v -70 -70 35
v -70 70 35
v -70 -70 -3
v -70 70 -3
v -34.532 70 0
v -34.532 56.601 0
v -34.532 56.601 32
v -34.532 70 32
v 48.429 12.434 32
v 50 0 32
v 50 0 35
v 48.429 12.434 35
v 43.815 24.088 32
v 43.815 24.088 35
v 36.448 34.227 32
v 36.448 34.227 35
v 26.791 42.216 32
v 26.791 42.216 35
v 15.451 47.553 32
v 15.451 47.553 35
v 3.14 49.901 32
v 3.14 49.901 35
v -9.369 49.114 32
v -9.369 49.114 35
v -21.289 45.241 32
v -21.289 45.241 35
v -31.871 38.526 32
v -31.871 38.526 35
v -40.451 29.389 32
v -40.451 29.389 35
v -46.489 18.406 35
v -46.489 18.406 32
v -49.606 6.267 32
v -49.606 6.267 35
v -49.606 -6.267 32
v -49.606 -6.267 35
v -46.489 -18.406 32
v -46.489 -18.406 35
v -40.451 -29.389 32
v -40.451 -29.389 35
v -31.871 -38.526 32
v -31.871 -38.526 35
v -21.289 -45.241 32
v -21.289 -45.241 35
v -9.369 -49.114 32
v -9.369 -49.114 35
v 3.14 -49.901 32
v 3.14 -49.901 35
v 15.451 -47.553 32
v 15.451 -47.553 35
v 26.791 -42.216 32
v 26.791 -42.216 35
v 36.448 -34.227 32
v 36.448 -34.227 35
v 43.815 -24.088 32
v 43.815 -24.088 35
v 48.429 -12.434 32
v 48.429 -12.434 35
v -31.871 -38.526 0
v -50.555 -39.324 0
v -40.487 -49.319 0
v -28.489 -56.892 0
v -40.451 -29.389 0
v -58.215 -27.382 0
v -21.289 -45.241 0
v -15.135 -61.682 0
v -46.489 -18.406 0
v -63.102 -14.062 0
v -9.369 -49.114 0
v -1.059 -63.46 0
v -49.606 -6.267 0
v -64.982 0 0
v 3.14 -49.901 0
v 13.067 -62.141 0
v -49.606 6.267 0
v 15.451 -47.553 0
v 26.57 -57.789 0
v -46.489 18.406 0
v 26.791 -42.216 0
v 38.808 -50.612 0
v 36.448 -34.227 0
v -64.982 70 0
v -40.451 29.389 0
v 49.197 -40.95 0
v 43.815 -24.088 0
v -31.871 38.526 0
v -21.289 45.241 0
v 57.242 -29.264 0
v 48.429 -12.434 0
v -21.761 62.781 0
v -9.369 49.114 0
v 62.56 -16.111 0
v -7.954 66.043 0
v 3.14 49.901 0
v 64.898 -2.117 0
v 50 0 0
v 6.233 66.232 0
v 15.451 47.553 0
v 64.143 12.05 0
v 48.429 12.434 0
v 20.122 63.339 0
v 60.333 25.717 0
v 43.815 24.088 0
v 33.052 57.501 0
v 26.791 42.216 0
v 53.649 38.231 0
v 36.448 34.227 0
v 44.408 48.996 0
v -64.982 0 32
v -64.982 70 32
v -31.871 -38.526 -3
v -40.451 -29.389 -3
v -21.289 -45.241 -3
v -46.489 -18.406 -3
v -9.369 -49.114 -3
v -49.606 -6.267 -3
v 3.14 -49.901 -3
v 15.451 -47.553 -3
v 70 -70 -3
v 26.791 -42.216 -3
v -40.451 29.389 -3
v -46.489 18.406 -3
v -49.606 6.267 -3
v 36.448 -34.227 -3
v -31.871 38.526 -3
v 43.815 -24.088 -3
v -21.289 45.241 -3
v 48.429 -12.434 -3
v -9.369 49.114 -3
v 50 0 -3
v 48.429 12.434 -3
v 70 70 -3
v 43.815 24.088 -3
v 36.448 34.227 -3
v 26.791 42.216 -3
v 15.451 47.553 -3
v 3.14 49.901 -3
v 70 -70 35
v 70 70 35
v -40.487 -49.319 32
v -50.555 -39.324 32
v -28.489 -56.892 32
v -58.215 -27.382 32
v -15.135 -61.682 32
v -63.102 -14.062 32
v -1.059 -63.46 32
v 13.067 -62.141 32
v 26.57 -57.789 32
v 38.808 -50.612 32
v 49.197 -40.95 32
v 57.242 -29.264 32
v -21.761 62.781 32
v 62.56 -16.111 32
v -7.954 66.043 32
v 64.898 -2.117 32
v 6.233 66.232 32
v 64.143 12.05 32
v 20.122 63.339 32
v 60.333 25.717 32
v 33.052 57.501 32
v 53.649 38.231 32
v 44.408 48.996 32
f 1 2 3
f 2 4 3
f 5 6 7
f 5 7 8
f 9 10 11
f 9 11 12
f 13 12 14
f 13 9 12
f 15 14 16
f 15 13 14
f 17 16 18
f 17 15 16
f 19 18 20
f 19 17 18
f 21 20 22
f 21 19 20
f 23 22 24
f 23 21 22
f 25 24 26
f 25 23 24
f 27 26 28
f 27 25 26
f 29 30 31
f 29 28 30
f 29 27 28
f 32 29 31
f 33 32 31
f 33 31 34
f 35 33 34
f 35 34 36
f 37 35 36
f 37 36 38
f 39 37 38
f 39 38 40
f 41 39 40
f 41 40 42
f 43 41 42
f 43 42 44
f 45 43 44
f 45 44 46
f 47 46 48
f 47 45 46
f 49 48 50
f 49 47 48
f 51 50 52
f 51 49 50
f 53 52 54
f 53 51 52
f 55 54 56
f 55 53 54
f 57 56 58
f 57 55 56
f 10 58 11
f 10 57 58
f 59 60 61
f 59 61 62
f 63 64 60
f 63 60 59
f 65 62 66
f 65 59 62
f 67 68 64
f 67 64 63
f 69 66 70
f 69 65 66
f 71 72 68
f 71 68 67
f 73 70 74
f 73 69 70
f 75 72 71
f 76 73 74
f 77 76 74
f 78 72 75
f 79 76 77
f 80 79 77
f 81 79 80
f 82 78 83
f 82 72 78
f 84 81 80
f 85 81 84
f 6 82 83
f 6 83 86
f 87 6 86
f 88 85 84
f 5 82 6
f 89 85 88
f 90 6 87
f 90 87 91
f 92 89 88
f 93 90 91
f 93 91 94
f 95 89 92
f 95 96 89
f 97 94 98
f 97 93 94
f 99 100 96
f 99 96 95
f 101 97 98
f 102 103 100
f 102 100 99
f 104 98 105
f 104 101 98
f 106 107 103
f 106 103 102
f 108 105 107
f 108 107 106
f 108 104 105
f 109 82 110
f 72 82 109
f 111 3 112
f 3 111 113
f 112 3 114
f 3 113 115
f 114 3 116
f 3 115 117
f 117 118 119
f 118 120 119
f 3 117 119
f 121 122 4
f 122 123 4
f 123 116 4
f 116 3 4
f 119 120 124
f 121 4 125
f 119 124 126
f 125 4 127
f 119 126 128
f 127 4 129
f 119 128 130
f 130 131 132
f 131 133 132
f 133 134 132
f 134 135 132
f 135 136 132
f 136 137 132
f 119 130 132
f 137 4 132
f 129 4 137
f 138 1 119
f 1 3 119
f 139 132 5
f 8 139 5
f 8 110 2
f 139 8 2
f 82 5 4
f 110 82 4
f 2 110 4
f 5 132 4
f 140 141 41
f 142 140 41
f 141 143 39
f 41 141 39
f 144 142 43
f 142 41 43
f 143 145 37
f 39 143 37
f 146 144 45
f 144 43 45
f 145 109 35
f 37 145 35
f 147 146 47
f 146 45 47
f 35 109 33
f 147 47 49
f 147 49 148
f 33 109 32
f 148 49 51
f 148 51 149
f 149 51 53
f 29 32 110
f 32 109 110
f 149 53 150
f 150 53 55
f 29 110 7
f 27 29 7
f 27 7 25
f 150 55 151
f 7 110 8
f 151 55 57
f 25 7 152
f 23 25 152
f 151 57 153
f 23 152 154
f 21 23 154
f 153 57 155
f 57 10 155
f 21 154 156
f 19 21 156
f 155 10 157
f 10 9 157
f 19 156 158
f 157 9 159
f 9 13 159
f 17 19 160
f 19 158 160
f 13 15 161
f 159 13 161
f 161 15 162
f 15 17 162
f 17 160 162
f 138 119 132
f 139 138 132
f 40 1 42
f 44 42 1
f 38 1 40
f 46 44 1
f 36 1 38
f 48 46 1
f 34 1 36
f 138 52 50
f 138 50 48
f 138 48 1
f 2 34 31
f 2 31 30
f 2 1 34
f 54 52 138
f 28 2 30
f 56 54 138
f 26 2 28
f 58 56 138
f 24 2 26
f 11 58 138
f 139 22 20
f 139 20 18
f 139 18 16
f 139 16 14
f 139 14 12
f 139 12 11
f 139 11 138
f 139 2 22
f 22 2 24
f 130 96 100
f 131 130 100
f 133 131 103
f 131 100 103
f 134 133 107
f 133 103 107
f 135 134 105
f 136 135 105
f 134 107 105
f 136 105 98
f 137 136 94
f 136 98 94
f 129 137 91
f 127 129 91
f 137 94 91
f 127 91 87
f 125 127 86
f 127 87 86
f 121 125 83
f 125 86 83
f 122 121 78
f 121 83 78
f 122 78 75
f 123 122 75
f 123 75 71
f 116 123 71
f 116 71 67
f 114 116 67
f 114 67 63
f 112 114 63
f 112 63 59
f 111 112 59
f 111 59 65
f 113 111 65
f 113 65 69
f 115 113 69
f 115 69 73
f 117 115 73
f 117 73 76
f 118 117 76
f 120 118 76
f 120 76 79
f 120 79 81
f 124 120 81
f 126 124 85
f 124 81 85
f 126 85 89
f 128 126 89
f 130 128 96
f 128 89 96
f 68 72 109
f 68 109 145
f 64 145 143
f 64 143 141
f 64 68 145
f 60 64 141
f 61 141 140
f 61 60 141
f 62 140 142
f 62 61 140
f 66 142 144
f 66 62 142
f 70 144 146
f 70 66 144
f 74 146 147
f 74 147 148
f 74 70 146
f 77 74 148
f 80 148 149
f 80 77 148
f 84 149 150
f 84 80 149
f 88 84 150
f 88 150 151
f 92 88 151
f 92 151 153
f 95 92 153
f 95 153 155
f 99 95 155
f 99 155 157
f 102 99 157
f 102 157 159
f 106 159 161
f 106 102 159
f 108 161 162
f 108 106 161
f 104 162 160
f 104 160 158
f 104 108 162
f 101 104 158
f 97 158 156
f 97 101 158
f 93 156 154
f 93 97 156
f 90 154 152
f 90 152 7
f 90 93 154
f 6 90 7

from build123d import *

# Parameters (mm, degrees)
F0_R     = 50
F1_DEPTH = 3
F2_DEPTH = 35
F3_DEPTH = 32
F4_DEPTH = 84.6
F5_DEPTH = 25


with BuildPart() as f1:
    # F0 (on Top) → F1 (new body)
    with BuildSketch(Plane.XY):
        with BuildLine():
            ThreePointArc((65, 1.5318503138), (31.467850574, 58.406927283), (-34.5315193925, 56.600663343))
            ThreePointArc((-34.5315193925, 56.600663343), (-56.5003016989, 33.6677478107), (-64.98194699, 3.0637006275))
            Line((-64.98194699, 3.0637006275), (-64.98194699, 0))
            ThreePointArc((-64.98194699, 0), (0.7659783442, -63.463636277), (65, 1.5318503138))
        make_face()
        Circle(F0_R, mode=Mode.SUBTRACT)
        Circle(F0_R)
        with BuildLine():
            Line((-70, -70), (70, -70))
            Line((70, -70), (70, 70))
            Line((70, 70), (-34.5315193925, 70))
            Line((-34.5315193925, 70), (-34.5315193925, 56.600663343))
            ThreePointArc((-34.5315193925, 56.600663343), (31.467850574, 58.406927283), (65, 1.5318503138))
            ThreePointArc((65, 1.5318503138), (0.7659783442, -63.463636277), (-64.98194699, 0))
            ThreePointArc((-64.98194699, 0), (-65, 1.5318503138), (-64.98194699, 3.0637006275))
            Line((-64.98194699, 3.0637006275), (-64.98194699, 70))
            Line((-64.98194699, 70), (-70, 70))
            Line((-70, 70), (-70, -70))
        make_face()
        with BuildLine():
            Line((-34.5315193925, 56.600663343), (-34.5315193925, 70))
            Line((-34.5315193925, 70), (-64.98194699, 70))
            Line((-64.98194699, 70), (-64.98194699, 3.0637006275))
            ThreePointArc((-64.98194699, 3.0637006275), (-56.5003016989, 33.6677478107), (-34.5315193925, 56.600663343))
        make_face()
        with BuildLine():
            Line((-64.98194699, 0), (-64.98194699, 3.0637006275))
            ThreePointArc((-64.98194699, 3.0637006275), (-65, 1.5318503138), (-64.98194699, 0))
        make_face()
    extrude(amount=-F1_DEPTH)

    # F2 (add): a face of the model
    f2_faces = [f1.faces().sort_by_distance(p)[0] for p in [
        (0, 0, 0),
    ]]
    extrude(f2_faces, amount=F2_DEPTH)

    # F0 (on Top) → F3 (cut)
    with BuildSketch(Plane.XY):
        with BuildLine():
            ThreePointArc((65, 1.5318503138), (31.467850574, 58.406927283), (-34.5315193925, 56.600663343))
            ThreePointArc((-34.5315193925, 56.600663343), (-56.5003016989, 33.6677478107), (-64.98194699, 3.0637006275))
            Line((-64.98194699, 3.0637006275), (-64.98194699, 0))
            ThreePointArc((-64.98194699, 0), (0.7659783442, -63.463636277), (65, 1.5318503138))
        make_face()
        Circle(F0_R, mode=Mode.SUBTRACT)
        Circle(F0_R)
        with BuildLine():
            Line((-34.5315193925, 56.600663343), (-34.5315193925, 70))
            Line((-34.5315193925, 70), (-64.98194699, 70))
            Line((-64.98194699, 70), (-64.98194699, 3.0637006275))
            ThreePointArc((-64.98194699, 3.0637006275), (-56.5003016989, 33.6677478107), (-34.5315193925, 56.600663343))
        make_face()
    extrude(amount=F3_DEPTH, mode=Mode.SUBTRACT)

    # F0 (on Top) → F4 (cut)
    with BuildSketch(Plane.XY):
        Circle(F0_R)
    extrude(amount=F4_DEPTH, mode=Mode.SUBTRACT)

    # F0 (on Top) → F5 (cut)
    with BuildSketch(Plane.XY):
        Circle(F0_R)
    extrude(amount=-F5_DEPTH, mode=Mode.SUBTRACT)


solid = f1.part
